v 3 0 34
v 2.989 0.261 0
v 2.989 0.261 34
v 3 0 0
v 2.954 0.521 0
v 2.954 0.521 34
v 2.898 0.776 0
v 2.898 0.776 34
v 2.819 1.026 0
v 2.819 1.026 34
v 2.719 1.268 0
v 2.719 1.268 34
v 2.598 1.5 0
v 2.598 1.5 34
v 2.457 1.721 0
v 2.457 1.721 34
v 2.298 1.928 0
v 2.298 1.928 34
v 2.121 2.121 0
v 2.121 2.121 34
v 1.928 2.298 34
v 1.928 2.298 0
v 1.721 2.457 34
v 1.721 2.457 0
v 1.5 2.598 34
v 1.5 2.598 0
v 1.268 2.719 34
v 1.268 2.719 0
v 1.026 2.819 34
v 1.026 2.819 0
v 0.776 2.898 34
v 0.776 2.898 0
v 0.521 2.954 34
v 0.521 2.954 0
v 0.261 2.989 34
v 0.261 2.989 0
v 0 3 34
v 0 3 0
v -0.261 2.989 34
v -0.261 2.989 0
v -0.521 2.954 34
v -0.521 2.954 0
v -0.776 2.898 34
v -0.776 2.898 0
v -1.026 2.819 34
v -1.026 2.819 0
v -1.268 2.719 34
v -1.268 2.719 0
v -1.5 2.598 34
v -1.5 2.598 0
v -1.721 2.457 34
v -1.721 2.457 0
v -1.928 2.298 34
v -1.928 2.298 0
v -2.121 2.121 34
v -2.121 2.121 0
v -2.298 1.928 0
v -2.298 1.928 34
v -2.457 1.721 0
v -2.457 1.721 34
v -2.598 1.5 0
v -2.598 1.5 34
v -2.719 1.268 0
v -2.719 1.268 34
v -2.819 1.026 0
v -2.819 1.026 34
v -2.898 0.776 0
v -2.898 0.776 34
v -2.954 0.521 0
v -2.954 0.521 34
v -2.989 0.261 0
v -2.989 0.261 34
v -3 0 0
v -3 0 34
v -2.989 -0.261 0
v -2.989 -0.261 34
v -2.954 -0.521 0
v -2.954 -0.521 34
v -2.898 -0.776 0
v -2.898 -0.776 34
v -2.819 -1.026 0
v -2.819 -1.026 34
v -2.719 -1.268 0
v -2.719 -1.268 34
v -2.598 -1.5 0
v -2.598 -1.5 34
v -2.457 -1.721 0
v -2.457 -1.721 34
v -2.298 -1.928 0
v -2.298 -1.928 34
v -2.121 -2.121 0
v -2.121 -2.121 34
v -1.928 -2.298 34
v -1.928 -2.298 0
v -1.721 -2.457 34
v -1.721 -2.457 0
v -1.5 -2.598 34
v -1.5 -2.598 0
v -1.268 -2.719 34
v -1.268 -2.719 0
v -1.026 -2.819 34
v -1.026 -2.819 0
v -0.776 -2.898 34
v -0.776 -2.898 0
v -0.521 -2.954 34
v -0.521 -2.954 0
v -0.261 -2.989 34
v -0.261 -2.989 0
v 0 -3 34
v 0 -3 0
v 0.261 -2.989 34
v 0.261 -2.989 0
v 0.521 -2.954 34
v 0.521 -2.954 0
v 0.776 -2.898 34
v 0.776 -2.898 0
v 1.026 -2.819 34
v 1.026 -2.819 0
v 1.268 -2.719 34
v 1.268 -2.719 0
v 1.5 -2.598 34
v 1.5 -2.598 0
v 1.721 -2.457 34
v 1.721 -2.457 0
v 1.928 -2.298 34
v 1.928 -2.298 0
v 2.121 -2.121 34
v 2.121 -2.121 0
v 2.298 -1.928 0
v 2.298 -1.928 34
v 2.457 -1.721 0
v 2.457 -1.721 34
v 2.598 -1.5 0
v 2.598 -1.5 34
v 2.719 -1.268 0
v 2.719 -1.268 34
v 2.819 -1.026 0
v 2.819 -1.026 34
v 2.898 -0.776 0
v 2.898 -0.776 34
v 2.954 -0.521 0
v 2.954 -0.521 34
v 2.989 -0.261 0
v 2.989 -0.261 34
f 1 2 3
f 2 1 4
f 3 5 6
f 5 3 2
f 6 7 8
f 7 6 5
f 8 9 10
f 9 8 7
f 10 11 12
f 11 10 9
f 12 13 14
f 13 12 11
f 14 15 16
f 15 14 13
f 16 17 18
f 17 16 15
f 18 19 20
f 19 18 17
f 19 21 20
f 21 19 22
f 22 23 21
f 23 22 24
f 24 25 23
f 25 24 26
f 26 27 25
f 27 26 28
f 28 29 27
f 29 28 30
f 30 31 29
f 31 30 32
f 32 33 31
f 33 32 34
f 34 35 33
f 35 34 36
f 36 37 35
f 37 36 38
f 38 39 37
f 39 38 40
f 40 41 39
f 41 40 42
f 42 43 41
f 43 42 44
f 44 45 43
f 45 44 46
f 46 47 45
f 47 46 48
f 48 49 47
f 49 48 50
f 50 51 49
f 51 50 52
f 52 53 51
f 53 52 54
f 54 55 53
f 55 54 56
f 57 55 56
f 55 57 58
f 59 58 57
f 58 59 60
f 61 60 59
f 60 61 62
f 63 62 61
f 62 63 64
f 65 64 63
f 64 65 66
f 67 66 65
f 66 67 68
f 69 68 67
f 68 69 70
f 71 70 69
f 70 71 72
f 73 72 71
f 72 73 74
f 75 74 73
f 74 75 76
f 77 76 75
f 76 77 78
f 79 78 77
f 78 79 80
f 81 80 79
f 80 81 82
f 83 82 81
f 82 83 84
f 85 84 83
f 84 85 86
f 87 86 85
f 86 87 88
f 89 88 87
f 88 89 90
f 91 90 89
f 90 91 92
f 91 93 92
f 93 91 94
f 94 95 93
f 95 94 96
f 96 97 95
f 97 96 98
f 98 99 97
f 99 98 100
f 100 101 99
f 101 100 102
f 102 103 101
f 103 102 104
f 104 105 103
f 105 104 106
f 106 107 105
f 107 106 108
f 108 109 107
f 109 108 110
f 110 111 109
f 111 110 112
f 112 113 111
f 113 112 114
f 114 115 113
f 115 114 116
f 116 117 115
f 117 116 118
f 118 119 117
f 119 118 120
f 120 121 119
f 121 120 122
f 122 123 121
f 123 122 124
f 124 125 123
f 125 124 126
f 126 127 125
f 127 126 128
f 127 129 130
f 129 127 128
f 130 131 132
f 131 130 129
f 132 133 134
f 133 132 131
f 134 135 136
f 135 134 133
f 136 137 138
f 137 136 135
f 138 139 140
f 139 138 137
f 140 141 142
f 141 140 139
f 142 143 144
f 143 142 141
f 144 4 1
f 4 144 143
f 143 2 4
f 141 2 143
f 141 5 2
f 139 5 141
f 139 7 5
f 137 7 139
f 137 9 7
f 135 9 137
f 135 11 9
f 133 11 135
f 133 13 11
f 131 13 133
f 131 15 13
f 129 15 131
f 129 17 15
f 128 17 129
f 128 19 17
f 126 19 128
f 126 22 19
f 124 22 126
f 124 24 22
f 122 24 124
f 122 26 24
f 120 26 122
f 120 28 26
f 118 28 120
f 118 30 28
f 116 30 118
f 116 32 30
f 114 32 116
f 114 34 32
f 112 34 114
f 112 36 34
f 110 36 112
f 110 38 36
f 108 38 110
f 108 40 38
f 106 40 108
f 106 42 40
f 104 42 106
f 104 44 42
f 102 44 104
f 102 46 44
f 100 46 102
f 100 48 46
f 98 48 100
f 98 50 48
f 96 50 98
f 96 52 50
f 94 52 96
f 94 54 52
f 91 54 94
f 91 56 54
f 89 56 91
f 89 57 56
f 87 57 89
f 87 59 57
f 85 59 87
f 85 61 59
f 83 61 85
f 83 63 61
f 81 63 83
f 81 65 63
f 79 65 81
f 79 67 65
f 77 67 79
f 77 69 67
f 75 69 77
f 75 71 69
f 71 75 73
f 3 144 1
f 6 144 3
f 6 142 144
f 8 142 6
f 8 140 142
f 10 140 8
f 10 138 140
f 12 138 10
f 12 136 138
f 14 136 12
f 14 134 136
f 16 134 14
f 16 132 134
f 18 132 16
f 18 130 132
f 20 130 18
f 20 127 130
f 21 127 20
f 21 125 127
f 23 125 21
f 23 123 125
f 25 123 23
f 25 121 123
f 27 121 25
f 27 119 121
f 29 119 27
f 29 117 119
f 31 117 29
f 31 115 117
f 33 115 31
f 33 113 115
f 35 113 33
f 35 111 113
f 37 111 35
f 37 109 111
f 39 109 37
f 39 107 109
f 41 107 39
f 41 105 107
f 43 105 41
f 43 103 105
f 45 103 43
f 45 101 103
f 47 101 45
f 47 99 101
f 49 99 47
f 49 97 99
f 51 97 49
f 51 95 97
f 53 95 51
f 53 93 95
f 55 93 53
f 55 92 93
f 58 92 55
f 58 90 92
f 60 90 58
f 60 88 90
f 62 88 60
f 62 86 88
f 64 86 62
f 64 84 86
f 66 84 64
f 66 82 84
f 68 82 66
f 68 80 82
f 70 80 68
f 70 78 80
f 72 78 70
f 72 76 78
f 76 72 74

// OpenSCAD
// file: common.scad
// ============================================================
// D29 牽引馬達教學模型 - 共用參數與輔助模組
// Shared parameters & helper modules for the traction-motor
// teaching aid, inspired by the "Type D29 Traction Motor"
// museum exhibit panel (Electromagnet Frame / Armature /
// Cables / Bearing / Gear).
// ============================================================

$fn = 72;

// ---- global fit ----
TOL      = 0.35;  // radial clearance for rotating/sliding fits
SCREW_D  = 3.2;    // M3 clearance hole
PILOT_D  = 2.6;    // M3 self-tap pilot hole (into a printed boss)
HEAD_D   = 6.4;    // M3 pan-head clearance
HEAD_H   = 3.2;

// ---- gears (齒輪 Gear drive to the wheel) ----
// MCAD's gear() sizes teeth from circular_pitch: pitch_diameter =
// number_of_teeth * circular_pitch / 180. Using the SAME circular
// pitch for both gears is what makes them mesh correctly.
GEAR_CIRC_PITCH = 360;
PINION_TEETH = 16;              // pitch dia. 32 mm -> on the armature
WHEEL_TEETH  = 32;              // pitch dia. 64 mm -> on the wheel axle
GEAR_THICK   = 6;
WHEEL_D      = 90;   // decorative "road wheel" disc driven by the axle gear
GEAR_CENTER_DIST = (PINION_TEETH + WHEEL_TEETH) * GEAR_CIRC_PITCH / 360; // = 48 mm

// ---- shaft / armature (Part B 電樞 Armature) ----
// Laid out sequentially along the shaft so nothing overlaps:
//   [0 .. BEARING_MARGIN]                bare shaft (near bearing journal)
//   [.. + COMM_LEN]                      commutator ring
//   [.. + GAP1]                          bare shaft / air gap
//   [.. + CORE_LEN]                      laminated core (sits inside the frame)
//   [.. + GAP2]                          bare shaft / air gap
//   [.. + DFLAT_LEN]                     D-flat drive end (the pinion sits on
//                                        the last GEAR_THICK mm of it, flush
//                                        with the shaft tip)
SHAFT_D       = 10;
BEARING_MARGIN = 8;
COMM_D        = 24;
COMM_LEN      = 16;
COMM_SEGS     = 12;
GAP1          = 8;
CORE_D        = 40;
CORE_LEN      = 50;
LAMINATION_N  = 12;   // number of simulated lamination grooves
GAP2          = 8;
DFLAT_LEN     = 24;    // length of the flat-sided drive end
DFLAT_CUT     = 2.6;   // material removed from round shaft to make the flat

COMM_Z        = BEARING_MARGIN;
CORE_Z        = COMM_Z + COMM_LEN + GAP1;
DFLAT_Z       = CORE_Z + CORE_LEN + GAP2;
SHAFT_LEN     = DFLAT_Z + DFLAT_LEN;
GEAR_Z        = SHAFT_LEN - GEAR_THICK;   // the pinion sits flush with the shaft tip
PIN_Z         = GEAR_Z + GEAR_THICK/2;    // retaining-pin hole, through the pinion's middle

// ---- frame / stator housing (Part A 磁框 Electromagnet Frame) ----
FRAME_ID     = CORE_D + 2*3.5;  // 3.5 mm air-gap each side
FRAME_WALL   = 7;
FRAME_OD     = FRAME_ID + 2*FRAME_WALL;
FRAME_LEN    = CORE_LEN + 20;
POLE_COUNT   = 4;
POLE_W       = 16;
POLE_PROJ    = 4;
// where the frame's own local z=0 sits once slid over the armature,
// so it is centred on the laminated core
FRAME_OFFSET = CORE_Z - (FRAME_LEN - CORE_LEN)/2;

// ---- bearing end caps (Part D 軸承 Bearing) ----
// slightly wider than the frame tube so the caps form a shoulder
// that rests against the stand's support collars
CAP_D        = FRAME_OD + 10;
CAP_T        = 9;
CAP_LIP_H    = 6;              // lip that sits inside the frame bore
BOLT_PCD     = FRAME_OD - 16;  // bolt circle diameter, 4 bolts

// ---- cable entry cover (Part C 引線 Cables) ----
CABLE_HOLE_D = 3.2;
CABLE_COUNT  = 4;

// ---- base display stand ----
// All shaft-axis parts (frame, armature, wheel axle) share ONE global
// layout: the shaft runs along +X at height SHAFT_HEIGHT. A part's own
// local Z axis (its "along the shaft" axis) is mapped onto global X by
// rotate([0,90,0]); its local z=0 lands at the given global X offset.
PLATE_W       = 200;
PLATE_D       = 150;
PLATE_T       = 6;
SHAFT_HEIGHT  = 55;   // height of the armature/wheel axle centreline above the base
WHEEL_AXLE_D  = 6;
COLLAR_OD     = FRAME_OD + 20;
COLLAR_T      = 10;

MOTOR_COLLAR_X1 = 40;                       // frame's local z=0 (near/commutator end)
MOTOR_COLLAR_X2 = MOTOR_COLLAR_X1 + FRAME_LEN;  // frame's local z=FRAME_LEN (far end)
ARMATURE_X0     = MOTOR_COLLAR_X1 - FRAME_OFFSET;  // armature's local z=0, in global X
GEAR_MESH_X     = ARMATURE_X0 + PIN_Z;      // global X where the pinion sits

WHEEL_POST_X1   = GEAR_MESH_X - 17;
WHEEL_POST_X2   = GEAR_MESH_X + 17;

// ---- text label helper ----
module label_text(txt, size=5.5, depth=0.8, font="WenQuanYi Zen Hei:style=Regular") {
    linear_extrude(height=depth)
        text(txt, size=size, halign="center", valign="center", font=font);
}

module bolt_clearance(h=20) {
    union() {
        cylinder(d=SCREW_D, h=h, center=true);
        translate([0,0,h/2-HEAD_H/2])
            cylinder(d=HEAD_D, h=HEAD_H+0.5, center=true);
    }
}

module bolt_pilot(h=20) {
    cylinder(d=PILOT_D, h=h);
}
// main file
// Wheel axle rod. Optional — a 6 mm wooden dowel/rod works just as
// well and is stronger for repeated classroom handling.
include <common.scad>
use <parts.scad>
axle(len = WHEEL_POST_X2 - WHEEL_POST_X1, d = WHEEL_AXLE_D);
